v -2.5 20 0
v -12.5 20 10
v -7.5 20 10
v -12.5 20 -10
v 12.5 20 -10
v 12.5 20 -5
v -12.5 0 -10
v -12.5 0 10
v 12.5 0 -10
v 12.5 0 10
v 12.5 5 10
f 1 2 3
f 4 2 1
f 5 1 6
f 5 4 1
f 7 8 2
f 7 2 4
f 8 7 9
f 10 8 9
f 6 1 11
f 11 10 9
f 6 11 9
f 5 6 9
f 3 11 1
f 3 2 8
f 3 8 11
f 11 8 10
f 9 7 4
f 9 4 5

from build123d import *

# Parameters (mm, degrees)
SKETCH_1_W          = 25
SKETCH_1_H          = 20
EXTRUDE_1_DEPTH     = 20
CUT_EXTRUDE_1_DEPTH = 20
CUT_EXTRUDE_5_DEPTH = 20


with BuildPart() as part:
    # 草圖1 → 填料-伸長1 (new body)
    with BuildSketch(Plane(origin=(0, 0, 0), x_dir=(1, 0, 0), z_dir=(0, 1, 0))):
        Rectangle(SKETCH_1_W, SKETCH_1_H)
    extrude(amount=EXTRUDE_1_DEPTH)

    # 草圖5 → 除料-伸長1 (cut)
    with BuildSketch(Plane(origin=(7.981651376, 10.642201835, 3.990825688), x_dir=(-0.818367137, 0.538104419, 0.201789157), z_dir=(-0.574695771, -0.766261028, -0.287347886))):
        Polygon((-5.521175546, -7.607674568), (18.917733471, -2.340822944), (12.808006217, 7.022468832), align=None)
    extrude(amount=-CUT_EXTRUDE_1_DEPTH, mode=Mode.SUBTRACT)

    # 草圖7 → 除料-伸長5 (cut)
    with BuildSketch(Plane(origin=(3.026315789, 9.078947368, 9.078947368), x_dir=(0.973328527, -0.162221421, -0.162221421), z_dir=(0.229415734, 0.688247202, 0.688247202))):
        Polygon((9.733285268, -3.535533906), (9.733285268, 17.67766953), (-5.67774974, 14.142135624), align=None)
    extrude(amount=CUT_EXTRUDE_5_DEPTH, mode=Mode.SUBTRACT)


solid = part.part
